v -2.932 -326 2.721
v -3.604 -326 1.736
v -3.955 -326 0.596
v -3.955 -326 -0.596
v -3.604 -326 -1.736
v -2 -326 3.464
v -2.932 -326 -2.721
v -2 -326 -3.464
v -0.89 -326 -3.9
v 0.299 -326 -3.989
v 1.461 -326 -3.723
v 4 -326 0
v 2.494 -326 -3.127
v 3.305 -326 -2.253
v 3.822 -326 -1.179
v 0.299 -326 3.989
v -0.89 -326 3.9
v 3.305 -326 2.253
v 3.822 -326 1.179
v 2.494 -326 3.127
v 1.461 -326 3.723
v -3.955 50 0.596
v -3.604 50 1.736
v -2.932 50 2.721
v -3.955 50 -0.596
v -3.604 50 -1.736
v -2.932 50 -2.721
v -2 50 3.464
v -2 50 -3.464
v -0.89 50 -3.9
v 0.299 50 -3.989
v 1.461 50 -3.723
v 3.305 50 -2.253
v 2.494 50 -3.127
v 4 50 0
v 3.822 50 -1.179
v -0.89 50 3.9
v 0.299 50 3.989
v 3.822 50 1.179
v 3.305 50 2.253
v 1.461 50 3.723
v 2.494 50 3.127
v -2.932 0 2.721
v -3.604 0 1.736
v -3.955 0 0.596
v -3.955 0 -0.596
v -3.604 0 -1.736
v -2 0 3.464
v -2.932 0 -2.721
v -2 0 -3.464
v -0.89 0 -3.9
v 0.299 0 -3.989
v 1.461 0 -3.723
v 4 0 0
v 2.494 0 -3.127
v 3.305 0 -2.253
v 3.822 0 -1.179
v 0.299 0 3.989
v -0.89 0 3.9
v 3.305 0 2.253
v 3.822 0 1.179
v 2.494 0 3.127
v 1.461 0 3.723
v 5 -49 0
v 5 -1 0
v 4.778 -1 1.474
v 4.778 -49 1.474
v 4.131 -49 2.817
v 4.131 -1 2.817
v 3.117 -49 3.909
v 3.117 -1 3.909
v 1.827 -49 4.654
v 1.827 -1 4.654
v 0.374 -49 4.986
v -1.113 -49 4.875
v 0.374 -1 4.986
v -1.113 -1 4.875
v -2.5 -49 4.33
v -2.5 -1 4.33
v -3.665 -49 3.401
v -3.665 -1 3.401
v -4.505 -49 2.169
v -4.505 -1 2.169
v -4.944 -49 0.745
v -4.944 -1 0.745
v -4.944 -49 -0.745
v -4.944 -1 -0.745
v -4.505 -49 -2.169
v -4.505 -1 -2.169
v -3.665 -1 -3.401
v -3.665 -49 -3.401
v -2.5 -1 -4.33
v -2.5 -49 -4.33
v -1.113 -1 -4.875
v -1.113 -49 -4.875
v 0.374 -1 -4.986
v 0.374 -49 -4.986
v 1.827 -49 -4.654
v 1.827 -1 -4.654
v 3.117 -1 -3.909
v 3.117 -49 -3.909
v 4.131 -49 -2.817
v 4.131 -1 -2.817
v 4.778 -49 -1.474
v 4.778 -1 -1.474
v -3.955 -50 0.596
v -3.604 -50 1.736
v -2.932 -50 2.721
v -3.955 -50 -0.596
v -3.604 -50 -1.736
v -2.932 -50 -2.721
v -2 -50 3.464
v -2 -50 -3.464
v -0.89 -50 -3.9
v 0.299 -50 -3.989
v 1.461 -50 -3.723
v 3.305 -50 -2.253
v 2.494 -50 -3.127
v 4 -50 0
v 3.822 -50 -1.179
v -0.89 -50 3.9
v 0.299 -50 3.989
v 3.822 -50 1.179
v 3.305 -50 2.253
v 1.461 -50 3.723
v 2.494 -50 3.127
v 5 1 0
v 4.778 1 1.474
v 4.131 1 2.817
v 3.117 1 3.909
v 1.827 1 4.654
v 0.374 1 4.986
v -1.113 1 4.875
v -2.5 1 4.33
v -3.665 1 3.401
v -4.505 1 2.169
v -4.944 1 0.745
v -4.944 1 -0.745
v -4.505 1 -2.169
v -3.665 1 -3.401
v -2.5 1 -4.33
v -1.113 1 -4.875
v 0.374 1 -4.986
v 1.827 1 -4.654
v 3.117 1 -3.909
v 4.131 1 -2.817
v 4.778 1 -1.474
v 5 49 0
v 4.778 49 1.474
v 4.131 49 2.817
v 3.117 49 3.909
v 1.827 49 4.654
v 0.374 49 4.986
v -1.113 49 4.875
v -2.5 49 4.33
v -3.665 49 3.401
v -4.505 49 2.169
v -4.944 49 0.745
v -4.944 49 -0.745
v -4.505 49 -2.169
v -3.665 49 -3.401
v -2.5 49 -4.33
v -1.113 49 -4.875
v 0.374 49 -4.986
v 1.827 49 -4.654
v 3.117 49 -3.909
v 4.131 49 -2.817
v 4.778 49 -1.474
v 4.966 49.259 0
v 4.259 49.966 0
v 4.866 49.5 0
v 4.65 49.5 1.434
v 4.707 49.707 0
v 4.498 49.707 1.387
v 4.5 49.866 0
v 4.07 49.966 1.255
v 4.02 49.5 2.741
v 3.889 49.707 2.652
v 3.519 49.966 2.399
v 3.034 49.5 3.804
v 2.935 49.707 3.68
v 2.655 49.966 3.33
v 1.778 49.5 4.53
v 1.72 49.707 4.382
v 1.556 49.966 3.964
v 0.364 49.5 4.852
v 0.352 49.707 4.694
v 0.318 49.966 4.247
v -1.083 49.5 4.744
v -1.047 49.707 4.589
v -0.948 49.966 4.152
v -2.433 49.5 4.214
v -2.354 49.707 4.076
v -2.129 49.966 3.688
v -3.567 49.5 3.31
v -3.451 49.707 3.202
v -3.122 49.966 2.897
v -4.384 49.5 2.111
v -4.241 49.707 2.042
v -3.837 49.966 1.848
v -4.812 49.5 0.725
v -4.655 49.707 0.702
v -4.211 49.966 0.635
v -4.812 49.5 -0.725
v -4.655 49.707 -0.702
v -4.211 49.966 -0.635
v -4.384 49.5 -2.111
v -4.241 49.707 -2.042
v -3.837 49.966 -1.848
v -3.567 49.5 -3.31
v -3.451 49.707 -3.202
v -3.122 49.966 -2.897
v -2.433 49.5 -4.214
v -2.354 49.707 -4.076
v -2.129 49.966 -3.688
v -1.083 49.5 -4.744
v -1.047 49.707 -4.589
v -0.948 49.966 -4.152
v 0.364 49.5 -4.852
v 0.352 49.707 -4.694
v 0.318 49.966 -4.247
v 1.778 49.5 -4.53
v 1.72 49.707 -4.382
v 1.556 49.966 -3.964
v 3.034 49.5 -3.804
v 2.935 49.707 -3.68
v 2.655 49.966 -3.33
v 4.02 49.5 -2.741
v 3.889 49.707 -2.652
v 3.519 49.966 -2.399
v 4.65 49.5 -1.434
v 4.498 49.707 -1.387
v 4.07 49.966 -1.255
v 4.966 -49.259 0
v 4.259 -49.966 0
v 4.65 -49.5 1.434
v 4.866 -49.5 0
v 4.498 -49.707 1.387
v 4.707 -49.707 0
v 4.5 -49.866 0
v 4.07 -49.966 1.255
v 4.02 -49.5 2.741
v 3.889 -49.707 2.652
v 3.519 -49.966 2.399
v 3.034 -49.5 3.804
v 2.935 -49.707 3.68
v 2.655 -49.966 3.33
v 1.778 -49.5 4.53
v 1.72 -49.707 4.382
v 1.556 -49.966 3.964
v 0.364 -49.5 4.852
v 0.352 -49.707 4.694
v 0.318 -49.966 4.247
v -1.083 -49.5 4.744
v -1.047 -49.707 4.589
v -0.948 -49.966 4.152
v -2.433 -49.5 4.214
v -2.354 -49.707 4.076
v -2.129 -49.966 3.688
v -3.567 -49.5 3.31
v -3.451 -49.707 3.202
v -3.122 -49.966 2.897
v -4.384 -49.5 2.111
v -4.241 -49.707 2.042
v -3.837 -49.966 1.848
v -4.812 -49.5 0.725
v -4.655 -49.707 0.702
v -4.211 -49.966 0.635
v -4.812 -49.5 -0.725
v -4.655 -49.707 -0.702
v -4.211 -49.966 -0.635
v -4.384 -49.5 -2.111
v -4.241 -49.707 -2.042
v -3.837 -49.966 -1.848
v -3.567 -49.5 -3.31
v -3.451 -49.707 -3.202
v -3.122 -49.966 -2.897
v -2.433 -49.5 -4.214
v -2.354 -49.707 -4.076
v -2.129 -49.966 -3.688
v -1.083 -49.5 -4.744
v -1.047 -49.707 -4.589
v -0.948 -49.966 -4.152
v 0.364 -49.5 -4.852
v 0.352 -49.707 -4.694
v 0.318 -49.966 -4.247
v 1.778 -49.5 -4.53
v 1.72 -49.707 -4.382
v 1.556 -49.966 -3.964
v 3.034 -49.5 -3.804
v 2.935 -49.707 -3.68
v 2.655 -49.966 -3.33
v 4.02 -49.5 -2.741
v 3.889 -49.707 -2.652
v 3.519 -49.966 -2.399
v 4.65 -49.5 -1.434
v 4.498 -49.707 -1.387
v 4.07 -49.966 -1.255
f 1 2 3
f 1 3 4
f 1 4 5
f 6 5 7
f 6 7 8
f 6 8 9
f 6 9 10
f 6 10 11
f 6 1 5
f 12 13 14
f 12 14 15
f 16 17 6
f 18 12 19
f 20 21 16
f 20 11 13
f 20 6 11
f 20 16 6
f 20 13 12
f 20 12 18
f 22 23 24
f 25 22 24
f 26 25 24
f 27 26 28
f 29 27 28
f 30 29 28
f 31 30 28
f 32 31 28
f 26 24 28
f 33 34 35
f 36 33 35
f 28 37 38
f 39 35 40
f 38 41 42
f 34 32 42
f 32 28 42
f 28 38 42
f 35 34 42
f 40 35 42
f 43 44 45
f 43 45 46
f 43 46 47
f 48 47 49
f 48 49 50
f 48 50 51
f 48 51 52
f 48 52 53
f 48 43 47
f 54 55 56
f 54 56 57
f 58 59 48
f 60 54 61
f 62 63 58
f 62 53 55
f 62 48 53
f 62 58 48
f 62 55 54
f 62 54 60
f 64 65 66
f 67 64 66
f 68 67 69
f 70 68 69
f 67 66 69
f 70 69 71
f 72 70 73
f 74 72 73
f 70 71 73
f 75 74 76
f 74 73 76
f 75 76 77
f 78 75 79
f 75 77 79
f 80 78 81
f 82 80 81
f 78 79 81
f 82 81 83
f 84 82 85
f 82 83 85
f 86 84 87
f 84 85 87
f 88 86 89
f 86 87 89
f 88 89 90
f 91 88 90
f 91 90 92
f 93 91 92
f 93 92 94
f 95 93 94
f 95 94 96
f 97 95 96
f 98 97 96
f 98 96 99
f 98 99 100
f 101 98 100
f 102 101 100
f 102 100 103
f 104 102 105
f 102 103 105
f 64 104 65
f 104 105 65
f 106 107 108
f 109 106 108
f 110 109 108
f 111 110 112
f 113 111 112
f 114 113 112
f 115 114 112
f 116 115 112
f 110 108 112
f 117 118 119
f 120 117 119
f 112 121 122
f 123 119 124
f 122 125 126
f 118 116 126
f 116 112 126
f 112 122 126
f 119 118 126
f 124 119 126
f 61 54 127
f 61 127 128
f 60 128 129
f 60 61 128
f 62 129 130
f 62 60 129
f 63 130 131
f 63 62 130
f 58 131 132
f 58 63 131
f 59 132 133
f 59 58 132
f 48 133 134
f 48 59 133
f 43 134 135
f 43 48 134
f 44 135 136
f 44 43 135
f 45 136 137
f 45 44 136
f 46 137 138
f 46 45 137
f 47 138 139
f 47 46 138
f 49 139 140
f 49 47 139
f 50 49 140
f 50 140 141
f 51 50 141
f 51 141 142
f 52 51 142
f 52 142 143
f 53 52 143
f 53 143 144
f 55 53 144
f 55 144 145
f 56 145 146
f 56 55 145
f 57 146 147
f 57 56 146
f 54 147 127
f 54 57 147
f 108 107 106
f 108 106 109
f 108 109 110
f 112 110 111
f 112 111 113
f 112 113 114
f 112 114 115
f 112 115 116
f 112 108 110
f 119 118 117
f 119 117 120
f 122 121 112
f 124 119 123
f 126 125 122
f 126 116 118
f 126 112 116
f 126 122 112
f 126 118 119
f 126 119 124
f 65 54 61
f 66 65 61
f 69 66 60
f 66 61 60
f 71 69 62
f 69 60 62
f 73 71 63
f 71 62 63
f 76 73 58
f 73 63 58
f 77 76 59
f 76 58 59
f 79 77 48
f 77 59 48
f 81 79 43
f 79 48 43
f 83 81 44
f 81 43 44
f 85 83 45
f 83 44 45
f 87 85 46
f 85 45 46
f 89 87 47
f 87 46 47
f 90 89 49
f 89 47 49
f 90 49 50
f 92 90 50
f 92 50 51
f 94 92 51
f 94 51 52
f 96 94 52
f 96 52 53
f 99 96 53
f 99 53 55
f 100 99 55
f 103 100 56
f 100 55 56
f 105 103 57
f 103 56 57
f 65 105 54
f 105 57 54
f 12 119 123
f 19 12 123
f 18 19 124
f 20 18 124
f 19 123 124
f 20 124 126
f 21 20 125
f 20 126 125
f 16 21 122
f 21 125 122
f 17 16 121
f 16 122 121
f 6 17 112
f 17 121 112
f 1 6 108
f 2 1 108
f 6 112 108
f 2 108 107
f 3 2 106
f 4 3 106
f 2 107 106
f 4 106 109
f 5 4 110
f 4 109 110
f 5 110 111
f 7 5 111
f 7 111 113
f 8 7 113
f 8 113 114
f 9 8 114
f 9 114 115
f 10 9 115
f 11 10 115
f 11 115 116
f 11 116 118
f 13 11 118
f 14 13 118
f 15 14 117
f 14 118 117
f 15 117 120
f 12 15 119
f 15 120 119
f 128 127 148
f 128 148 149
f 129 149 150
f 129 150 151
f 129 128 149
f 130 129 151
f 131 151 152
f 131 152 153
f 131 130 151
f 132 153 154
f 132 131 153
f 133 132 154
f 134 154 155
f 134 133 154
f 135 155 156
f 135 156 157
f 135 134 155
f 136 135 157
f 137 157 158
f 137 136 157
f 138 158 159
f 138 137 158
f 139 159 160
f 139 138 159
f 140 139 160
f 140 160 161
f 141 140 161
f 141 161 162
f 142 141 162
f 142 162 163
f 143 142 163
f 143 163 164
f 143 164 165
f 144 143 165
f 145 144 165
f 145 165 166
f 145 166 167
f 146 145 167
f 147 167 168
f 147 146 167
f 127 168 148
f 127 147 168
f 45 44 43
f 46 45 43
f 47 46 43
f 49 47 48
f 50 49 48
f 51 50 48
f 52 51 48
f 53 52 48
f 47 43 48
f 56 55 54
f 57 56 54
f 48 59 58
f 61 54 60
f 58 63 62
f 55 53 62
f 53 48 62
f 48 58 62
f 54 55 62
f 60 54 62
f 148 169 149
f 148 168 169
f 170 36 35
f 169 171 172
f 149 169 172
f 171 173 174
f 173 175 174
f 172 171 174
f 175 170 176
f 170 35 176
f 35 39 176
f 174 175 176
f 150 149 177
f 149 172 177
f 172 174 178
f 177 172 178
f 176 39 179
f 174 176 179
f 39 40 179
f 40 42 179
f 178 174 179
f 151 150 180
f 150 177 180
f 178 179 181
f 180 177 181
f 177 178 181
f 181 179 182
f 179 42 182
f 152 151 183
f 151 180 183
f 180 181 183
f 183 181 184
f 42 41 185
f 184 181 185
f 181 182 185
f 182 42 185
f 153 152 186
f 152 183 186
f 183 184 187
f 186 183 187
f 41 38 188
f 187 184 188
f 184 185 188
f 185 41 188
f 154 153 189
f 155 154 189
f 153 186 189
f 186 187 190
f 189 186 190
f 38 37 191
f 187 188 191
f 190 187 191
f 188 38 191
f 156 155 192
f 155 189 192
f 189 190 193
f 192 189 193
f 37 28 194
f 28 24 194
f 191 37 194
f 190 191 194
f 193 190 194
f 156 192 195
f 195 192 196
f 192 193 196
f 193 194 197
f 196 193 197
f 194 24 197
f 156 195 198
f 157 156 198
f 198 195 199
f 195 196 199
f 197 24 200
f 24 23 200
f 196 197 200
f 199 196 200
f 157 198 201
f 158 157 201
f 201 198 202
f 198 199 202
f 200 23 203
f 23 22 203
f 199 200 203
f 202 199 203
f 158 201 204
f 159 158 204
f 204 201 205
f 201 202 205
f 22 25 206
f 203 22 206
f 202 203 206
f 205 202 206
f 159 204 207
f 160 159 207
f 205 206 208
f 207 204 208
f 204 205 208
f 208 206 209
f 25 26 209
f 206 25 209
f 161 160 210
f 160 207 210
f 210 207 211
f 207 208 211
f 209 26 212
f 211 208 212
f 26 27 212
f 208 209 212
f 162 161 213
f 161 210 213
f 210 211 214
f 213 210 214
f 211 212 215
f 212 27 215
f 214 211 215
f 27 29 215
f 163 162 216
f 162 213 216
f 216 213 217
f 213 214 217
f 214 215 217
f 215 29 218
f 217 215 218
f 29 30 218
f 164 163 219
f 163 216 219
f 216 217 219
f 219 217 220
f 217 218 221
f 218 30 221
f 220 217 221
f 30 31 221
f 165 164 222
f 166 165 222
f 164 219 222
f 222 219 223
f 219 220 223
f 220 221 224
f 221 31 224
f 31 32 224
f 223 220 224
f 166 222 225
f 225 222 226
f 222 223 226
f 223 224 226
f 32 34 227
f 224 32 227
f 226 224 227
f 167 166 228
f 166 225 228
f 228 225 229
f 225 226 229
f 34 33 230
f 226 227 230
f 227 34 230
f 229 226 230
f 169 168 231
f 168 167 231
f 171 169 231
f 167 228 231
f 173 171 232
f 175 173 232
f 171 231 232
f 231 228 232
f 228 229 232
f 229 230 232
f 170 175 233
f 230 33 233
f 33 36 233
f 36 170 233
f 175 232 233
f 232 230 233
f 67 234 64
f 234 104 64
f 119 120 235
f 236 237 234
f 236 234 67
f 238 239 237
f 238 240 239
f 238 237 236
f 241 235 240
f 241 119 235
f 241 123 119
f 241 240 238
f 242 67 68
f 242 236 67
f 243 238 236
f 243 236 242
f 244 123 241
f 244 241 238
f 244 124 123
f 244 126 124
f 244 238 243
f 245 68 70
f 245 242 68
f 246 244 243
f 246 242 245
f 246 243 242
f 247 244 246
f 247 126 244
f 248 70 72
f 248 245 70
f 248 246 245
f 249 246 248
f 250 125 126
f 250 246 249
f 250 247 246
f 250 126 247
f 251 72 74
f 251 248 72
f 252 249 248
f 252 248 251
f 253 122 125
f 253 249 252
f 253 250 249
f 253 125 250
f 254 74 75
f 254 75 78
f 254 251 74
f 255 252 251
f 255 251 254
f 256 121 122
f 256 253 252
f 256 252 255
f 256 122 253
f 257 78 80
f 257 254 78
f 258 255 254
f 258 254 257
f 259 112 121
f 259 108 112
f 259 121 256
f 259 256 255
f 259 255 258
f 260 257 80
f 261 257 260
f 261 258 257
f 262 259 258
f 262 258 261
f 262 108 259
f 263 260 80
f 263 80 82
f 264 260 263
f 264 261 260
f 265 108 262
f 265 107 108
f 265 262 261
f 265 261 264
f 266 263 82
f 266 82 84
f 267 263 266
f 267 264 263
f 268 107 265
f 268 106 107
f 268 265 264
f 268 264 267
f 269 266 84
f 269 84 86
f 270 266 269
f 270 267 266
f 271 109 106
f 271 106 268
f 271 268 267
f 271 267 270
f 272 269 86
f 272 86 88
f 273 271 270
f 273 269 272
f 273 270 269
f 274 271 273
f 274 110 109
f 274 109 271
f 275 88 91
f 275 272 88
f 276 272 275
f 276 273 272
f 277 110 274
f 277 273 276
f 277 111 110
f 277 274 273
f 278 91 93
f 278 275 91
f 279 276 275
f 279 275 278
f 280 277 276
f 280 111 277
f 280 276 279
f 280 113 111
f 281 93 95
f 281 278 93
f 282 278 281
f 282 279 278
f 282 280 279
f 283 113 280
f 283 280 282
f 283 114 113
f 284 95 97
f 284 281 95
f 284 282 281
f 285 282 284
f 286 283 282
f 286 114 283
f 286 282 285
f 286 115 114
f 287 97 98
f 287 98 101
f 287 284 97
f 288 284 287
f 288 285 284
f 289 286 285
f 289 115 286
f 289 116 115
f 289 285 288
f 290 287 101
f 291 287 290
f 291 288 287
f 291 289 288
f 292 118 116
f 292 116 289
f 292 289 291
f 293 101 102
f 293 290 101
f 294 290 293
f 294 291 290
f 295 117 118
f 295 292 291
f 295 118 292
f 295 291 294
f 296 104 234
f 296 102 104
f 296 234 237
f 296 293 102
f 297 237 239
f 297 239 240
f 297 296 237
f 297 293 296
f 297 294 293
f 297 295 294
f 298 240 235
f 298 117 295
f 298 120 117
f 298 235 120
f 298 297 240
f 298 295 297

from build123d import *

# Parameters (mm, degrees)
F0_R      = 5
F1_DEPTH  = 50
F2_R      = 1
F3_SIZE   = 1
F1_FACE_R = 4
F5_DEPTH  = 276


with BuildPart() as f1:
    # F0 (on Front) → F1 (new body)
    with BuildSketch(Plane.XZ):
        Circle(F0_R)
    extrude(amount=F1_DEPTH)

    # F2
    f2_edges = [f1.edges().sort_by_distance(p)[0] for p in [
        (-5, -50, 0),
    ]]
    fillet(f2_edges, radius=F2_R)

    # F3
    f3_edges = [f1.edges().sort_by_distance(p)[0] for p in [
        (-5, 0, 0),
    ]]
    chamfer(f3_edges, length=F3_SIZE)


with BuildPart() as f4_1:
    # F4: instance of F1
    add(f1.part.mirror(Plane.XZ))


with BuildPart() as f5:
    # F1_face (on face) → F5 (new body)
    with BuildSketch(Plane.XZ.offset(50)):
        Circle(F1_FACE_R)
    extrude(amount=F5_DEPTH)


solid = Compound([f1.part, f4_1.part, f5.part])
